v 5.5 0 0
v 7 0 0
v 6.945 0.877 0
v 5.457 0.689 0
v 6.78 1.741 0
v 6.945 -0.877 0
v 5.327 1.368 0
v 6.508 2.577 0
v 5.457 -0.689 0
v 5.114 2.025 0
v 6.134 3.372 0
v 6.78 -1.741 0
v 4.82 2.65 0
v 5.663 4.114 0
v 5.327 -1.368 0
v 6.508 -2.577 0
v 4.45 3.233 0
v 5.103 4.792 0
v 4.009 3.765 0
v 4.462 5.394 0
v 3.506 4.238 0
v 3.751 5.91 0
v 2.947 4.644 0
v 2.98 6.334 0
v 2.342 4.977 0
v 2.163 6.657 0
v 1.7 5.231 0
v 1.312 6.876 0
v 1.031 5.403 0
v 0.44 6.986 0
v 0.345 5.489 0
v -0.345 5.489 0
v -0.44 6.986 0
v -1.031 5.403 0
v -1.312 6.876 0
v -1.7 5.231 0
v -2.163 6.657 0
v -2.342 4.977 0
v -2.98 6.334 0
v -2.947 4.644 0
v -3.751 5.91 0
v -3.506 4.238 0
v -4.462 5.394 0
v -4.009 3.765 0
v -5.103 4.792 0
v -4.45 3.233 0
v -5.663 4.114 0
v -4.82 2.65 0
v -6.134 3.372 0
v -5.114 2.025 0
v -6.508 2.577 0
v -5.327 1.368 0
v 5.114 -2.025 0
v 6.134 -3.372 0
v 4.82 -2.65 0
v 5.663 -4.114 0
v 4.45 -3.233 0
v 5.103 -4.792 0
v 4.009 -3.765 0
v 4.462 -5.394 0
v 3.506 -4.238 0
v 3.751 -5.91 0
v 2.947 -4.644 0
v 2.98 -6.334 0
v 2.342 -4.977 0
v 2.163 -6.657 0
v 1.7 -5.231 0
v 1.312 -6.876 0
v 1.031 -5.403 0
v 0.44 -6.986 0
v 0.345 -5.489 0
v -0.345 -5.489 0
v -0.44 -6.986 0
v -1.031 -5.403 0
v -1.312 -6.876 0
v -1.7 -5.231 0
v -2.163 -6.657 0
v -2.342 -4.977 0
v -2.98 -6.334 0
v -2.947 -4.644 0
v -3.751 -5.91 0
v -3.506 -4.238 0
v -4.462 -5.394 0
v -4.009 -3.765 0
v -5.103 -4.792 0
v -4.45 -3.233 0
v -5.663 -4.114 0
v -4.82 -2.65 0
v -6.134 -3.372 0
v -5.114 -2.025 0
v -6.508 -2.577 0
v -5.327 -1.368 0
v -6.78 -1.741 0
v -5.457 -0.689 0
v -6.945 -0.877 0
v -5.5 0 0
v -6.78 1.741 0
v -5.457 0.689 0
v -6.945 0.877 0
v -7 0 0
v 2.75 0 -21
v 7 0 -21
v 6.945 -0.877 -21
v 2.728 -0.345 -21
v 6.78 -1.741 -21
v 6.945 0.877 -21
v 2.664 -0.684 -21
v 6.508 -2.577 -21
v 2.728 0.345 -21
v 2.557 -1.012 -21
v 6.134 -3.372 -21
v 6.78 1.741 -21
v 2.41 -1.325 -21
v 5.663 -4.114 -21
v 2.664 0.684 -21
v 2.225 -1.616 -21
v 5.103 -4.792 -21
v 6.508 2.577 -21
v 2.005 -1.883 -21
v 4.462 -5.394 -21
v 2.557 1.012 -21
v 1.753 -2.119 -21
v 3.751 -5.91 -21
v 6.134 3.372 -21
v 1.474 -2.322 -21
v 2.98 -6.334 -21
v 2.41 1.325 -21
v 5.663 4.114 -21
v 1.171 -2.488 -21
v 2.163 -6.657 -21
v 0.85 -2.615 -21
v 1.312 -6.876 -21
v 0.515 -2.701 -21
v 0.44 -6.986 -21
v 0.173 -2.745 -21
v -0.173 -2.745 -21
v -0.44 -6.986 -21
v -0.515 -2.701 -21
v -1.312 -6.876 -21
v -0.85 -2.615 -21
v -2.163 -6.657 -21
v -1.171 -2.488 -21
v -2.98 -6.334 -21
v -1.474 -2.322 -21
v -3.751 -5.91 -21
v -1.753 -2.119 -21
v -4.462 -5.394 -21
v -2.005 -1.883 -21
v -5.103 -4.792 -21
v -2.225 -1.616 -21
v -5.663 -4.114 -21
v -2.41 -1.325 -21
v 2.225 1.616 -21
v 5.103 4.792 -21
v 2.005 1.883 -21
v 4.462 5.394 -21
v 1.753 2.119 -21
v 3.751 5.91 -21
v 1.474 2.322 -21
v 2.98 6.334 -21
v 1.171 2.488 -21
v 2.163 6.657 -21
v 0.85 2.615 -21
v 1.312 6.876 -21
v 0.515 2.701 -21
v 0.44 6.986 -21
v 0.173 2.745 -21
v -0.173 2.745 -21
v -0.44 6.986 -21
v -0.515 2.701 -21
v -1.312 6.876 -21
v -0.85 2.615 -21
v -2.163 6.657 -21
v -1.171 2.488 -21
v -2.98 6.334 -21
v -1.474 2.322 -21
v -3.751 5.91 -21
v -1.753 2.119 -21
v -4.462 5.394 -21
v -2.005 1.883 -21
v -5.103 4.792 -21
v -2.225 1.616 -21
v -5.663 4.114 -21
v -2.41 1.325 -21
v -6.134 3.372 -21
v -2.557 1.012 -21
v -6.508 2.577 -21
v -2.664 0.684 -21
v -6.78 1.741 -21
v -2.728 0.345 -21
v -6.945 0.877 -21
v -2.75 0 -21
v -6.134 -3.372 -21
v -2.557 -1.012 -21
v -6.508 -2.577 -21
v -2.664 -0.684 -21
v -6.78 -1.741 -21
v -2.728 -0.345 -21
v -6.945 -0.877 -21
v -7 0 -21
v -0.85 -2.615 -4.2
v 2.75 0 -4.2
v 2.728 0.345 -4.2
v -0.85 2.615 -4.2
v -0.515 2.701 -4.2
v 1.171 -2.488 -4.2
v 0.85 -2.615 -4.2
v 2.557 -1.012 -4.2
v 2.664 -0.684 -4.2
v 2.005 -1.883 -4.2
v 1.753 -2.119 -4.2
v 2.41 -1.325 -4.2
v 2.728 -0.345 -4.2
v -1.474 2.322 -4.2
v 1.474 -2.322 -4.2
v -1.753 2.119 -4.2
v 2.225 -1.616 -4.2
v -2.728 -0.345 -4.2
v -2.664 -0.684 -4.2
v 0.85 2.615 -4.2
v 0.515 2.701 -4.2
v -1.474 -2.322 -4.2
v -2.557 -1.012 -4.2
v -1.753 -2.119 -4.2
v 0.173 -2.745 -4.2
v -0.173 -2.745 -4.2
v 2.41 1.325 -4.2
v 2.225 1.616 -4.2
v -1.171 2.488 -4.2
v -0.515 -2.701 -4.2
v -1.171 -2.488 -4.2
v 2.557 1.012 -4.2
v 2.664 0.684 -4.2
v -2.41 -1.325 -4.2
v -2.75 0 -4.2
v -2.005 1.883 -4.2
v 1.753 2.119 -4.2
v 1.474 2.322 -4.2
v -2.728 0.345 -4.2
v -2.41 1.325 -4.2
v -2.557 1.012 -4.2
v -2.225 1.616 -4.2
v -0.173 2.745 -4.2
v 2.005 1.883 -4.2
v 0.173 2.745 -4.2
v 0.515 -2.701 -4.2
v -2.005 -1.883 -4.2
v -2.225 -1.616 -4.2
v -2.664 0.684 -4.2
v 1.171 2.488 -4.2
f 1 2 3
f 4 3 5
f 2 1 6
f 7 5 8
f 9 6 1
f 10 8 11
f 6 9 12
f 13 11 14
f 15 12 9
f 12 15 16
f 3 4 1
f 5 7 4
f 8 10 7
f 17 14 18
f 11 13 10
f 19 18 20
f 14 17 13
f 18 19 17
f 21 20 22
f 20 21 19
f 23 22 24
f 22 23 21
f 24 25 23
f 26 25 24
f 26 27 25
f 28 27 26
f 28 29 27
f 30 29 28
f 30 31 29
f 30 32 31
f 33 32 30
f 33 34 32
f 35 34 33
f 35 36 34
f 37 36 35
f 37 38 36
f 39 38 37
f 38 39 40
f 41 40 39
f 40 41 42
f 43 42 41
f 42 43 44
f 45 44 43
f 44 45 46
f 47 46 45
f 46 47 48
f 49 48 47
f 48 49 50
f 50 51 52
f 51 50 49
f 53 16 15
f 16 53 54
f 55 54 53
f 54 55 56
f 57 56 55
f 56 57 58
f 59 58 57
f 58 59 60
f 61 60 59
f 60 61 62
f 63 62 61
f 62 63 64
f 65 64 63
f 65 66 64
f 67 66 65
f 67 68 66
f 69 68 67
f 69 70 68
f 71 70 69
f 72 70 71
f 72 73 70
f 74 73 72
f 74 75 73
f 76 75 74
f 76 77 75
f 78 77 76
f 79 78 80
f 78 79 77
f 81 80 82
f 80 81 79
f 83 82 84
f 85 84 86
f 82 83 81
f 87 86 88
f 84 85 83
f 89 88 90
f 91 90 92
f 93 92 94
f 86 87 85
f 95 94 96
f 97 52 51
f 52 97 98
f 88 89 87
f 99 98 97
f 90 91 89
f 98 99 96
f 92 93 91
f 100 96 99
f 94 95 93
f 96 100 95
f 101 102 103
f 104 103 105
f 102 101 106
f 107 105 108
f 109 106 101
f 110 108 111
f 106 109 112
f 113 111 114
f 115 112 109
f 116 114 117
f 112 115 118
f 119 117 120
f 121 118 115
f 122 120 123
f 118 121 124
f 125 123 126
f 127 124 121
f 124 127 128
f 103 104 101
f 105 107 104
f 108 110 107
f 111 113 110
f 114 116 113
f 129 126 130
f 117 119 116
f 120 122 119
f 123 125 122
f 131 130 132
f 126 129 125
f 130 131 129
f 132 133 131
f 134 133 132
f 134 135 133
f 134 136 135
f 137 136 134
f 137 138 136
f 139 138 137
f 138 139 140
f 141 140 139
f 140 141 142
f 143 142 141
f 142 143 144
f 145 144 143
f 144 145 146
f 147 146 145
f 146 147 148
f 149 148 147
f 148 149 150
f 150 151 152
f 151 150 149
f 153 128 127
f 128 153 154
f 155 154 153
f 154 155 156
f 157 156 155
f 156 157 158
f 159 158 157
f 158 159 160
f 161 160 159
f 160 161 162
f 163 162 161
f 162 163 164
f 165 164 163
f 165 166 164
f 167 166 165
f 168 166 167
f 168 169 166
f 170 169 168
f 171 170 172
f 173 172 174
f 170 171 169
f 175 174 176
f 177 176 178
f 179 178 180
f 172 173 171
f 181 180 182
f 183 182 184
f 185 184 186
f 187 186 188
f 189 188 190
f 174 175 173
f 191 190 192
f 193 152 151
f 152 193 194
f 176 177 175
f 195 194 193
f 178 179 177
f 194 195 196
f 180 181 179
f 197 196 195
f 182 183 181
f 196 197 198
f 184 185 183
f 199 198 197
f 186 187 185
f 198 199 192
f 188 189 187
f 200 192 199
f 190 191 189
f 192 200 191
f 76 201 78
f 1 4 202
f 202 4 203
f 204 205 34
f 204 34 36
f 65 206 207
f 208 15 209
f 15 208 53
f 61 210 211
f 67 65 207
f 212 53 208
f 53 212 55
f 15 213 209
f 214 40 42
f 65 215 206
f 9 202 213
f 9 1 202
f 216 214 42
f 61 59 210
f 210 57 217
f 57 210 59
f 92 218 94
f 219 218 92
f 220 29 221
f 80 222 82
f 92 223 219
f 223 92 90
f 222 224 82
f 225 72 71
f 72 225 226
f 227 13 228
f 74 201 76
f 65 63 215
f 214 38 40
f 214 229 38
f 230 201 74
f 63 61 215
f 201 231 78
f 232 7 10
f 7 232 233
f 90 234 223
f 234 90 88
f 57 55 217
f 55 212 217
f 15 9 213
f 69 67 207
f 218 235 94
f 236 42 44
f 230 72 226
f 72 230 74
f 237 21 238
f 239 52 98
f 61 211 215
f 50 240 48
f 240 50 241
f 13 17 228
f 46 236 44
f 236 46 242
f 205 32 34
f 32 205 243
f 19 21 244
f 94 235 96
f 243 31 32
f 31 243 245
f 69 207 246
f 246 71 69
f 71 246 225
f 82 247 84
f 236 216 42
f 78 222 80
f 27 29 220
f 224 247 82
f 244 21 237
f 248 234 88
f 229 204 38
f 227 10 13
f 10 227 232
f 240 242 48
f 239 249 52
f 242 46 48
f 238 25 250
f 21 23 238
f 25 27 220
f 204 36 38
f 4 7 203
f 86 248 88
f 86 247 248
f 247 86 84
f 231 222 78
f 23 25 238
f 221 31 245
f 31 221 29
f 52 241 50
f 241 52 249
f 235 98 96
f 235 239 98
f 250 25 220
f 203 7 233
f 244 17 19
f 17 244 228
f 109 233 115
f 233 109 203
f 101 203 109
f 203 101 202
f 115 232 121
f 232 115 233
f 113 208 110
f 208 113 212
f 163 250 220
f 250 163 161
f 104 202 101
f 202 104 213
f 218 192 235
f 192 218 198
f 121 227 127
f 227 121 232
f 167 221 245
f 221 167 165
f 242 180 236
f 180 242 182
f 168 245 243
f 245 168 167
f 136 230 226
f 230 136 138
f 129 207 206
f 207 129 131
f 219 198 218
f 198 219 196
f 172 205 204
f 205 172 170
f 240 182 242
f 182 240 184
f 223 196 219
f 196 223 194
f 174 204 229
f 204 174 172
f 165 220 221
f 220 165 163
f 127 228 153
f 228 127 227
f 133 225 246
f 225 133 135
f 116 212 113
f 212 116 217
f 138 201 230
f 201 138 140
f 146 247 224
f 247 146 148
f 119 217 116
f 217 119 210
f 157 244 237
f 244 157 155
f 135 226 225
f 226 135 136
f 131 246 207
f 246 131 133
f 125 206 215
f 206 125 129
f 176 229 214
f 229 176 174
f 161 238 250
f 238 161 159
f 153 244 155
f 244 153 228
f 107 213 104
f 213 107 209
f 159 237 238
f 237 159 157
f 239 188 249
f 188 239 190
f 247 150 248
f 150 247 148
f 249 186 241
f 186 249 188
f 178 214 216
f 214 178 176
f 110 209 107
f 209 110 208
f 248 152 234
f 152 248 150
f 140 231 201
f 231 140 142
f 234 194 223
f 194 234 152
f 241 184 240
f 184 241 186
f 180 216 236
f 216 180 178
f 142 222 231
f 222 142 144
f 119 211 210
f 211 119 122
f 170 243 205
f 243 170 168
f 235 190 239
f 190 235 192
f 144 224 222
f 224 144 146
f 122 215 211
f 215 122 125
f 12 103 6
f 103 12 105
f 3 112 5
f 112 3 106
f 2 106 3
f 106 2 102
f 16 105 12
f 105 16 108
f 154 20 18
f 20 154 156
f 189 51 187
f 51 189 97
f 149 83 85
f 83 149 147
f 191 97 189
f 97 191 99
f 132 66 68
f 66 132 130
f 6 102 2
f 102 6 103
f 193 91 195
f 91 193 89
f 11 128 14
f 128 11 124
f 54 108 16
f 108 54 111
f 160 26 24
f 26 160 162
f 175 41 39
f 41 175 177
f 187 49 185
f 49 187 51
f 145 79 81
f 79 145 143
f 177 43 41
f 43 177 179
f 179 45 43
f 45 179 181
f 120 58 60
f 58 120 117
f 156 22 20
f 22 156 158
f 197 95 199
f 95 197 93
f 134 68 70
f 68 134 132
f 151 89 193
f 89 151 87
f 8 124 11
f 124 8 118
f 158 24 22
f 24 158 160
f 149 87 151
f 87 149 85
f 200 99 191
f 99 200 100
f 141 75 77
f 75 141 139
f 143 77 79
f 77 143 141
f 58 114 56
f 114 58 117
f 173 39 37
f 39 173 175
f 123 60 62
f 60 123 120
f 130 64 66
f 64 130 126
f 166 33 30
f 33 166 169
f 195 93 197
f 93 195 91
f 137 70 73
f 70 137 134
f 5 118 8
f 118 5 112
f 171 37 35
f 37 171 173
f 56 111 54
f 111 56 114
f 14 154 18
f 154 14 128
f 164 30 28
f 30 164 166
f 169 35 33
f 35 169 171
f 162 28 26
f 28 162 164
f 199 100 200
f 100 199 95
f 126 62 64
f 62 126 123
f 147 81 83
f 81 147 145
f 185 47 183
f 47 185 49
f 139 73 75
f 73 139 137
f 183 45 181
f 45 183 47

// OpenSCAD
$fn = 50;


difference() {
	union() {
		translate(v = [0, 0, -21.0000000000]) {
			cylinder(h = 21, r = 7.0000000000);
		}
		cylinder(h = 0, r = 16.0000000000);
	}
	union() {
		translate(v = [0, 0, 0]) {
			rotate(a = [0, 0, 0]) {
				difference() {
					union() {
						#translate(v = [0, 0, -21.0000000000]) {
							cylinder(h = 21, r = 2.2500000000);
						}
						#translate(v = [0, 0, -4.2000000000]) {
							cylinder(h = 4.2000000000, r1 = 2.7500000000, r2 = 5.5000000000);
						}
						#translate(v = [0, 0, -21.0000000000]) {
							cylinder(h = 21, r = 2.7500000000);
						}
						#translate(v = [0, 0, -21.0000000000]) {
							cylinder(h = 21, r = 2.2500000000);
						}
					}
					union();
				}
			}
		}
	}
}
